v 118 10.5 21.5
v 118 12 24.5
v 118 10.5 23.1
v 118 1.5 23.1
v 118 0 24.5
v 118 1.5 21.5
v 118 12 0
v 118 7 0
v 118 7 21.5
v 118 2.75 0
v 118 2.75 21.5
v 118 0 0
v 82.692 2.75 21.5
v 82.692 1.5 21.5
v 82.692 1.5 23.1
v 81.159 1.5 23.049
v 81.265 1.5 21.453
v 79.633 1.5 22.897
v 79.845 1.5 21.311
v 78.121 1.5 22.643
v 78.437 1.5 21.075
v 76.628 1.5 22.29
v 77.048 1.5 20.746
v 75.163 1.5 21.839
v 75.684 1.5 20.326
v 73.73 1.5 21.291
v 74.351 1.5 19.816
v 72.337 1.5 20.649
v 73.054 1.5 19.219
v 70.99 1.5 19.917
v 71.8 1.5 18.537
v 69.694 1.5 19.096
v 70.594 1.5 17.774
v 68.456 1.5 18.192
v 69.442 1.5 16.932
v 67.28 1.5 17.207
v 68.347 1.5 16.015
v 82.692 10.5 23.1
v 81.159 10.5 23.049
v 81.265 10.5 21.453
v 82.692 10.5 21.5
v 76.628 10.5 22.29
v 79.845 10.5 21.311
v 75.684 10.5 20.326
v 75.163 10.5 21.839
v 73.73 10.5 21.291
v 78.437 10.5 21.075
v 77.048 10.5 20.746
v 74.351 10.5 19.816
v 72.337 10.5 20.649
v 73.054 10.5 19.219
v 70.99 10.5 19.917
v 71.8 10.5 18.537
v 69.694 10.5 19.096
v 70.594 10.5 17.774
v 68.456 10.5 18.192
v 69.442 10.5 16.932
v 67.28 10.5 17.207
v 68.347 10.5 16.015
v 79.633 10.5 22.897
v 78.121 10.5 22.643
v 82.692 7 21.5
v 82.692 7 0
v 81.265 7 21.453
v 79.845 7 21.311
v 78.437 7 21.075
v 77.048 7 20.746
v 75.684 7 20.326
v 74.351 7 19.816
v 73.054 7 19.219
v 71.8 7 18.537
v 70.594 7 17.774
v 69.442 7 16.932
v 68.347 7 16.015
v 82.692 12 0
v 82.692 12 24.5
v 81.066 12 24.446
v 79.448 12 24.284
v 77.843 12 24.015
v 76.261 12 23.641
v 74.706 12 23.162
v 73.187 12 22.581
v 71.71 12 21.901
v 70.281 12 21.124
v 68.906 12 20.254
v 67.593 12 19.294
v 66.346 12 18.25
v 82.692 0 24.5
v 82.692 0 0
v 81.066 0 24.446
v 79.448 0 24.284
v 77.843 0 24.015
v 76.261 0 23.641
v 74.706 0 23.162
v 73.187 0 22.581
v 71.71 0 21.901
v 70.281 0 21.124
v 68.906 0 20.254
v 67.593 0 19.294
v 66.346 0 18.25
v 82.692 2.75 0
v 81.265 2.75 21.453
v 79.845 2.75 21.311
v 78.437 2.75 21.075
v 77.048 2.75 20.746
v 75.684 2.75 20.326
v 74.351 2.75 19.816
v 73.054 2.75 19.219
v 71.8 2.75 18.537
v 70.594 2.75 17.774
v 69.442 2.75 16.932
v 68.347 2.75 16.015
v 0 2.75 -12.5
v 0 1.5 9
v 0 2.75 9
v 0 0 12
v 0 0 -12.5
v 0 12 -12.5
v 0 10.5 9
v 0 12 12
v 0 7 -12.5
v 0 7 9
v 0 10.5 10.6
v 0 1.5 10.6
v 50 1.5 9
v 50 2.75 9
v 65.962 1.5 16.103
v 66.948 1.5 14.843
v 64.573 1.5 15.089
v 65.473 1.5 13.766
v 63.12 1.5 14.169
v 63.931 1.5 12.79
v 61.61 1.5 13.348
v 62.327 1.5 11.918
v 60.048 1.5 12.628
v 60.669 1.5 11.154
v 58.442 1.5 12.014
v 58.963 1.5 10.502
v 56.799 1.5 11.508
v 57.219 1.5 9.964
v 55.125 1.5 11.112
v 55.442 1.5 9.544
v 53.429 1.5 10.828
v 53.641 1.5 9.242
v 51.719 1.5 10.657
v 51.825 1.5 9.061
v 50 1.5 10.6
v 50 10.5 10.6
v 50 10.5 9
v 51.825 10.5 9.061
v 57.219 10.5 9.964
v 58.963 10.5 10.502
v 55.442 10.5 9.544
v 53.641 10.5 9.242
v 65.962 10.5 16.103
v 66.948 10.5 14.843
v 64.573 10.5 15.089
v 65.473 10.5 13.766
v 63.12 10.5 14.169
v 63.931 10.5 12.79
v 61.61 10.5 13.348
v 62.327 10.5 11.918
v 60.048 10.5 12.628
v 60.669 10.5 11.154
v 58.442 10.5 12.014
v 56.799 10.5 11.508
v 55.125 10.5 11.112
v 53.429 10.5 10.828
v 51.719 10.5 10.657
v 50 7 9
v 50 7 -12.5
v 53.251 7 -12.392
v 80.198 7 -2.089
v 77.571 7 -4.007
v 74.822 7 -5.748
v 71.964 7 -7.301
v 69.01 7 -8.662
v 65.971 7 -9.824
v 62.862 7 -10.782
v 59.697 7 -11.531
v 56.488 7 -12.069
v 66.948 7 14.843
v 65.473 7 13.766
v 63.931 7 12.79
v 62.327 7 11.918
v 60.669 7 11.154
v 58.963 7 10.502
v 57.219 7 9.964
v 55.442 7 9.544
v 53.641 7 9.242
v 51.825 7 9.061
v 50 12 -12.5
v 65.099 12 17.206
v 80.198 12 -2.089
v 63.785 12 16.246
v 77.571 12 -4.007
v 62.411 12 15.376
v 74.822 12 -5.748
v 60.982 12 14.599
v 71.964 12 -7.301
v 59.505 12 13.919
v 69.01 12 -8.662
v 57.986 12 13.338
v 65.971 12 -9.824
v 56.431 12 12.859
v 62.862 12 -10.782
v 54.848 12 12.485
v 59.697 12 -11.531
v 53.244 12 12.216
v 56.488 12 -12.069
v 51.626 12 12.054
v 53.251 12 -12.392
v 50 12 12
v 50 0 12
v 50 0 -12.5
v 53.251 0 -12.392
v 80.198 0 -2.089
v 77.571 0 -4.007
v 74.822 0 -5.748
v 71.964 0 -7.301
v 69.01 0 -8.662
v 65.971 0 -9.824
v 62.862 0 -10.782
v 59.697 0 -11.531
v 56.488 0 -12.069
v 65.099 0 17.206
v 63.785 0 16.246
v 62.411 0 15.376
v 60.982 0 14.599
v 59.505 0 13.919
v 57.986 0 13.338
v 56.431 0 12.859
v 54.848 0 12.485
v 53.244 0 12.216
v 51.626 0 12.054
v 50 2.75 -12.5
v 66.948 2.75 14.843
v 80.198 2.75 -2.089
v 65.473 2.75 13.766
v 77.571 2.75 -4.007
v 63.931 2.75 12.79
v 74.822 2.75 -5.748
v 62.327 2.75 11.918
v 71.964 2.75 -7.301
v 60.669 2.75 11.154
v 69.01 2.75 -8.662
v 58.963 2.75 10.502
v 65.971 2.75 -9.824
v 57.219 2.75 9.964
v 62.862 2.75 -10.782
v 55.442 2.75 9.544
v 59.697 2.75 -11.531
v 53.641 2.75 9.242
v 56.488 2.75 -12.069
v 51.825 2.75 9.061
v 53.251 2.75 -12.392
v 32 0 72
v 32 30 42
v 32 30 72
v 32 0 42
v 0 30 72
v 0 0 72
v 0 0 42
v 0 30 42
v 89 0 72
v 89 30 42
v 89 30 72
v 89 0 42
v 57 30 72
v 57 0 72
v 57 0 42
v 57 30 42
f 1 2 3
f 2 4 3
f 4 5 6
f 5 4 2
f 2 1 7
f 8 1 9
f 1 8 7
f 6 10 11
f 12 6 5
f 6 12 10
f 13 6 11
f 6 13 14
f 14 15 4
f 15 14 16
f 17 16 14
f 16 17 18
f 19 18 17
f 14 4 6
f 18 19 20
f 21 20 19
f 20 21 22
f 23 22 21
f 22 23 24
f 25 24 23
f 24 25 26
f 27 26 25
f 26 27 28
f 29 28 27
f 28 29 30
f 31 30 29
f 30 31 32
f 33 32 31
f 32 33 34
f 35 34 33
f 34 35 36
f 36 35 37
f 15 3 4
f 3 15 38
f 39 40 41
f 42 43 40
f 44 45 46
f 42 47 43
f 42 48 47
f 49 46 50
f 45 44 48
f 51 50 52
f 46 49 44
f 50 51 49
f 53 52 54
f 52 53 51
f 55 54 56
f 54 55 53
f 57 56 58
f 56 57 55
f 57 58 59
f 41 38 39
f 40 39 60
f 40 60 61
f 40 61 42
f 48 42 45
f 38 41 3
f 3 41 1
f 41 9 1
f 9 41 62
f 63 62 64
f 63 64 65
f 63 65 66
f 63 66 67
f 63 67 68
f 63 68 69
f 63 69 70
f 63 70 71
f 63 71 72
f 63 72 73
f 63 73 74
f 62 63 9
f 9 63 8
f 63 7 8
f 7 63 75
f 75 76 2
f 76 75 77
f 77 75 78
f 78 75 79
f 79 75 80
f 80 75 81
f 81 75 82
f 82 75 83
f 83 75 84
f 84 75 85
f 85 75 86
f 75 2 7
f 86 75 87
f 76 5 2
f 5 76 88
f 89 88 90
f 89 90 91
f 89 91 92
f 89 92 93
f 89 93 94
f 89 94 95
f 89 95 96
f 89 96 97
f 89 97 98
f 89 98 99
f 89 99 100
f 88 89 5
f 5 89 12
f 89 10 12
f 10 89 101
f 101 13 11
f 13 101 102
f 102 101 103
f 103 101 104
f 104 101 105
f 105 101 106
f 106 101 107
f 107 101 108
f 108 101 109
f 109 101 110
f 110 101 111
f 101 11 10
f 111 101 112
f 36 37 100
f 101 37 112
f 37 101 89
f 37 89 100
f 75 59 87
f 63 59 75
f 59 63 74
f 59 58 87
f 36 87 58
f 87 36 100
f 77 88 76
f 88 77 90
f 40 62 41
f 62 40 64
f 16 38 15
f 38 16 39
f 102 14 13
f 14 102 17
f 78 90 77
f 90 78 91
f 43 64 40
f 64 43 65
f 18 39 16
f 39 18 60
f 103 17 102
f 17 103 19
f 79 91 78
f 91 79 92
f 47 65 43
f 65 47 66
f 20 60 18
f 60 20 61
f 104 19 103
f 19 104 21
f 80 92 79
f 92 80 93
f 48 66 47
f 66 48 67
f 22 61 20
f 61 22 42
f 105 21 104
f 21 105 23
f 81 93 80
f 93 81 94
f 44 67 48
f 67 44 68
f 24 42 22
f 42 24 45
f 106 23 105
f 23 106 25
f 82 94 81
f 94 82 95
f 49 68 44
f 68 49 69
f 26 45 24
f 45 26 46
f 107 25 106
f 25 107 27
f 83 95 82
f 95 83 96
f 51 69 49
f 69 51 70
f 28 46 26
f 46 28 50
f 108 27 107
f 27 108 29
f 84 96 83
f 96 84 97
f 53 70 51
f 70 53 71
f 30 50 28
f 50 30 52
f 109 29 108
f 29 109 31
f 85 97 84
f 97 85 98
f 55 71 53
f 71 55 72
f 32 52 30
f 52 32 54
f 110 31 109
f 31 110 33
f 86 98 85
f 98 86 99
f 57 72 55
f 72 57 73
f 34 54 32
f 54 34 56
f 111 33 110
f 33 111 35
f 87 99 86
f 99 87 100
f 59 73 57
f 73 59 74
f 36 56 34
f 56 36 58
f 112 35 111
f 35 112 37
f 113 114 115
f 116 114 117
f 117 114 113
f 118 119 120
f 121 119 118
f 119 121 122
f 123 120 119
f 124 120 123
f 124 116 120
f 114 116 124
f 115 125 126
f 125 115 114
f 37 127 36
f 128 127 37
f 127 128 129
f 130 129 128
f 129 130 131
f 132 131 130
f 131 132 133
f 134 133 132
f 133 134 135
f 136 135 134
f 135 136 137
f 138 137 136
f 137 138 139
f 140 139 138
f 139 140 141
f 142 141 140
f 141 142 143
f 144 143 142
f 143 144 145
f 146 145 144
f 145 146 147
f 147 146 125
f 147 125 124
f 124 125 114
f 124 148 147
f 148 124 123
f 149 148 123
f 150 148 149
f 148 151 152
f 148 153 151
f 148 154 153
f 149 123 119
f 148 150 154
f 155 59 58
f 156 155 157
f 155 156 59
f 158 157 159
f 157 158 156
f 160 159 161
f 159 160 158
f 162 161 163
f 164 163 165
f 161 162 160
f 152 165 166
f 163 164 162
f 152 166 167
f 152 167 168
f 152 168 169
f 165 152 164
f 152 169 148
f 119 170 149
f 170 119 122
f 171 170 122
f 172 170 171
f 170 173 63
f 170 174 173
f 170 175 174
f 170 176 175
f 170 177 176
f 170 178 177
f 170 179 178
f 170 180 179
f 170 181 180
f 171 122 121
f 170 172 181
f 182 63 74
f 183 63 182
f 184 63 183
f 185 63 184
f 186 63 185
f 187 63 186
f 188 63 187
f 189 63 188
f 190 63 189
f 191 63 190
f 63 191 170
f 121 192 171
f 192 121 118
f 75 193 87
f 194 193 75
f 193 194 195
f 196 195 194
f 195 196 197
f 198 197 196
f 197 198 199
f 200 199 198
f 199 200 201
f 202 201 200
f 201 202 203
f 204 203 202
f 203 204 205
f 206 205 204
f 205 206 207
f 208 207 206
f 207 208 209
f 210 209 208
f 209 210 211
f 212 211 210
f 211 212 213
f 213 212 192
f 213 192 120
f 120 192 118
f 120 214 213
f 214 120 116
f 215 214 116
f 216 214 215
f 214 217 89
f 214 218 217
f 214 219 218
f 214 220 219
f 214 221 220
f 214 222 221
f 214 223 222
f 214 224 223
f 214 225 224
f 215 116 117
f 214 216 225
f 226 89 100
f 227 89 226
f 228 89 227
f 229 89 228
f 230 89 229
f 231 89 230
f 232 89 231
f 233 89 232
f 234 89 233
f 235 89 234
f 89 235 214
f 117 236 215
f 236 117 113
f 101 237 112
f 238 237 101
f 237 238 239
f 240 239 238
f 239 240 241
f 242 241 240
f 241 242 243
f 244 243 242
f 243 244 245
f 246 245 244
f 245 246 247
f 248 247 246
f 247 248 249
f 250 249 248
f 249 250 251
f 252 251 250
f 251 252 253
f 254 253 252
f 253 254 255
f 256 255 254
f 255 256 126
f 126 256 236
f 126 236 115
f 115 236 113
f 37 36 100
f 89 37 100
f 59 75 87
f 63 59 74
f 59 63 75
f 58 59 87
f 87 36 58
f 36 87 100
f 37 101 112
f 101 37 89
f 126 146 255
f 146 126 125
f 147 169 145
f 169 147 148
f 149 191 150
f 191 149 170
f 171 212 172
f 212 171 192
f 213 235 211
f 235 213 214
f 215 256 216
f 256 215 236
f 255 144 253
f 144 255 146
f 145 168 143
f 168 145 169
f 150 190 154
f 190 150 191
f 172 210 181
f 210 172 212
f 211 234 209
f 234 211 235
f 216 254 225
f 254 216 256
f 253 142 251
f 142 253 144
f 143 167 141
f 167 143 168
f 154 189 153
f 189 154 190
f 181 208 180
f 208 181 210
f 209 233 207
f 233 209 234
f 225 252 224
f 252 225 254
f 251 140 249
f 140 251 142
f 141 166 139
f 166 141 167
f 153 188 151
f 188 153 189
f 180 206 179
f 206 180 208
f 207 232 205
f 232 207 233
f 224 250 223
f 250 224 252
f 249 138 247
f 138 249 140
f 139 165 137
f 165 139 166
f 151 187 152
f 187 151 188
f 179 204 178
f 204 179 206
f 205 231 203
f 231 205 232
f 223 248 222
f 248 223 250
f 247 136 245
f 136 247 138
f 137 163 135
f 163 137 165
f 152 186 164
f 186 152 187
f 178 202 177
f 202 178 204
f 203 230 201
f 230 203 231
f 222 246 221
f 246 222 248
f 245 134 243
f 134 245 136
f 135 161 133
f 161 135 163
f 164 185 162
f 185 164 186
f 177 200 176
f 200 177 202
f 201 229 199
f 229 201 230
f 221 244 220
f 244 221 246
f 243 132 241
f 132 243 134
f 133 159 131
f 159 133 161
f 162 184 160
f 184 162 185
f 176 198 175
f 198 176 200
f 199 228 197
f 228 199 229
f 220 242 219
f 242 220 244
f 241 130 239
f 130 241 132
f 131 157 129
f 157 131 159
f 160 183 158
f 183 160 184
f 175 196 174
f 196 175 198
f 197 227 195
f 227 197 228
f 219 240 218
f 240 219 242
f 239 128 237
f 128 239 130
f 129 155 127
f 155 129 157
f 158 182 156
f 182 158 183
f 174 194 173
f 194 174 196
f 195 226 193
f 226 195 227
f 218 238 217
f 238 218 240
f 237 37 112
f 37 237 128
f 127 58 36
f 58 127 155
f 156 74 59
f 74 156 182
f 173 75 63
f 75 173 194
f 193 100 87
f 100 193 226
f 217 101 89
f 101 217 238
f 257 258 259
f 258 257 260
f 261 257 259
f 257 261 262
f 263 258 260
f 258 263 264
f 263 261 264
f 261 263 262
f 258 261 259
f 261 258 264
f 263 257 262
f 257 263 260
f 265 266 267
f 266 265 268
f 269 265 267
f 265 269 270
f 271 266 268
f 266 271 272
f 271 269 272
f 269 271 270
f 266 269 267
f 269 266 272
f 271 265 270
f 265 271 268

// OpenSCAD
// Parameters for a parameterized drag feeder for the YY1 with better peeling

// The idea is that instead of using the under-tape tensioner (which gives inconsistant results depending on the component, the tape, etc), this uses a toothed wheel that engages the tape and has a 2mm step length.

// Initial version does not include a curve for output feeding, instead it just ends a bit early and the tape should just be manually routed into the discharge trench.  This is designed to also make it easier to remove the excess tape.


// The width of the tape (mm)
feederWidth = 8;

// The additional width for the entire feeder assembly
additionalWidth = 4;

// The length of a feeder unit
feederLength = 118;

// Where on the feeder the pick happens
pickStart = 5;

// And the length of the opening
pickLength = 20;

// How deep the drag feeder pin is assumed to be
pinDepth = 5;

// And how wide the opening for it
pinWide = 2.4;

// Where on the feeder to include the friction unit
frictionLocation = 75;

// Where the base of the tape is located
tapeBase = 21.5;

// How wide the tape groove is:  Paper tape is 1.1mm thick max, plastic is 0.6mm.
tapeThick = 1.6;

// How much to support the sprocket side
supportLeftSize = 1.75+1.25;

// How much to support the opposite side
supportRightSide = 0.75;

// How much additional tape clearance horizontally on each side
tapeClearance = 0.5;

// Bearing inner diameter (mm)
bearingID = 4;

// Bearing outer diameter (mm)
bearingOD = 11;

// Bearing length (mm) for the portion that
// overlaps.  The bearing itself is 4mm 
// but we want some spacing
bearingLength = 3.5;

// Bearing OD margin, adjust in your printer for a snug fit.
bearingODMargin = 0.05 ;

// Bearing ID Margin, adjust in your printer for a snug fit.
bearingIDMargin = 0.0;

// Number of gear pins to engage the tape.
gearPins = 18;

// How much smaller should the gear itself be
gearReduction = 0.3;

// Gear pin radius, the holes are .75mm radius
// that it engages into
gearPinRadius = 0.5;

// Gear pin length
gearPinLength = 1.2;

// Gear pin base height;
gearPinBaseHeight = .45;

printGear = true;
printHolder = true;
printBase = true;
printGearHolder = true;

baseHeight = 8;
baseWidth = 10;
baseLength = 156;


// Derived, the radius for the 
// gear itself that engages in the tape:
// The pins are 4mm apart on the tape
gearRadius = (gearPins * 4) / (2 * PI) - gearReduction;

// The distance between the center of the gear and the teeth on the tape itself
tapeOffset = gearRadius + gearReduction;

// The height of the gear that engages the pins.
gearHeight = 4.9 + (feederWidth - 8) ;

// The size of the teeth in the gear for engaging the friction spring.
toothSize = 4.0;

// The radius for locating the cubes that engage the friction spring.
toothRadius = 4.2;

holderSpace = 8.0 - 1.8;

sideThick = 2;

springSpace = toothRadius + toothSize/sqrt(2)/2 + .3; // 0.2;

springThick = 2.0;

springMargin = 0.8;

springLong = 8;

// Bearing cushion in the gear
bearingCushionDepth = 0.5;

// Thickness of the top
topThick = 0.8;

// Using 8mmx3mm magnets in the base

magnetRadius = 4.05;
magnetThick = 3.2;

magnetLoc1 = 10;
magnetLoc2 = feederLength - 10;
magnetLoc3 = feederLength/2;

notchOne = 30;

notchTwo = 95;

notchWidth = baseWidth;

margin = .2;

baseTapeHeight = tapeBase;
profileHeight = tapeBase+3;

lowProfileHeight = 12;
lowProfileLength = 50;

module profile() {
  width = feederWidth + additionalWidth;
  leftWidth = width - additionalWidth/2-supportLeftSize;
  leftTapeSlot = width - additionalWidth/2 + tapeClearance;
    rightTapeSlot = additionalWidth/2 - tapeClearance;
  rightWidth = additionalWidth/2 + supportRightSide;
  tapeBase = baseTapeHeight;
  tapeTop = tapeBase + tapeThick;
  height = profileHeight;
  polygon([[0,0],
          [0,height],
           [width, height],
           [width, 0],
           [leftWidth, 0],
           [leftWidth, tapeBase],
           [leftTapeSlot, tapeBase],
           [leftTapeSlot, tapeTop],
           [rightTapeSlot, tapeTop],
           [rightTapeSlot, tapeBase],
           [rightWidth, tapeBase],
           [rightWidth, 0]
           ]);
}

module profileFeeder(){
difference(){
  // Want the angle to be such that the increase in 
  // height for each direction is half the difference.
  
  heightDifference = (profileHeight-lowProfileHeight)/2;
  
  // Added height is (1 - cos(angle) * profileHeight, so 
  // we have cos(angle) = 1-heightDifference/profileHeight)
  
  profileAngle = acos(1-heightDifference/profileHeight);
  pickAt = feederLength-pickStart-pickLength;
  lowLength = lowProfileLength;
  curveLength = sin(profileAngle) * profileHeight;
  
  
  topOfCurveHeight = (1 - cos(profileAngle)) * profileHeight + lowProfileHeight ;
  
  union(){
  
  // First part, at the low range
  translate([0,0,lowProfileHeight-profileHeight]) rotate([90,0,90]) linear_extrude(lowLength) profile();

  // Then the curve up: its radius along
  // the top is profileHeight, along the bottom it is 2*profileHeight  
  translate([lowProfileLength,0,lowProfileHeight-profileHeight+2*profileHeight]) {
        rotate([0,90,90])
        rotate_extrude(angle=-profileAngle, $fn=100) 
        rotate(90) 
        translate([0, -2*profileHeight])
        profile();
    }
    
    translate([lowProfileLength + 2 * curveLength, 0, 0]) {
      rotate([90,0,90]) linear_extrude(feederLength - lowLength - 2 * curveLength) profile();
    
    
      rotate([0,90,90])rotate_extrude(angle=-profileAngle, $fn=100) rotate(90) profile();
    
    }
    
   
  }
//   translate([-100,-100,-100]) cube([500,500,100]);
  }
}


module profileFeederAssembled(){
    ficHigh = 24.4;

  difference() {
    profileFeeder();

      
      translate([feederLength - pickStart - pickLength, 
        additionalWidth + feederWidth - 1.75 - pinWide,
        tapeBase - pinDepth]) cube([pickLength, pinWide, 100]);
        
     
     translate([feederLength - magnetLoc1, (feederWidth + additionalWidth)/2, -0.1]) cylinder(h=magnetThick+.1, r=magnetRadius, $fn=100);
     
          
     translate([feederLength - magnetLoc2, (feederWidth + additionalWidth)/2, -0.1]) cylinder(h=magnetThick+.1, r=magnetRadius, $fn=100);
     
          
     translate([feederLength - magnetLoc3, (feederWidth + additionalWidth)/2, -0.1]) cylinder(h=magnetThick+.1, r=magnetRadius, $fn=100);
     
     translate([feederLength-frictionLocation, -1, ficHigh]) rotate([-90, 0, 0]) cylinder(h=100, r=gearRadius + gearPinLength+1, $fn=100);
     
    translate([notchOne-notchWidth/2, 20, 0]) rotate([90,0,0]) baseHoleExtrusion(); //cube([notchWidth, 100, notchHeight]);
    
     translate([notchTwo-notchWidth/2, 20, 0]) rotate([90,0,0]) baseHoleExtrusion(); //cube([notchWidth, 100, notchHeight]);
   }
   difference(){
   translate([feederLength - frictionLocation, 0, ficHigh]) rotate([-90,0,0]) gearHolder();
    translate([20,additionalWidth/2,-14.5]) cube(30);
   }

  }



module displayHeads(){
  color("red") {
    translate([0,0,42]) cube([32,30,30]);
    translate([32+25,0,42]) cube([32,30,30]);
    }
}


module baseExtrusion(){
  rotate([90,0,90])
  linear_extrude(height=baseLength){
     polygon(points = [[0,0],[0,baseHeight],[baseWidth, baseHeight],[baseWidth+2, 0]]);
  }
}
 module baseHoleExtrusion(){
   rotate([0,0,0])
   linear_extrude(height=100) {
      polygon(points = [[-margin, -margin],
      [-margin, baseHeight+margin],
      [baseWidth+margin, baseHeight+margin],
      [baseWidth+2+margin, margin],
      [baseWidth+2+margin, 0]]);
        
   }
}

module base(){
  difference(){
//    baseHoleExtrusion();
    baseExtrusion();
    for(i = [0 : 3]) {
      translate([baseLength-5.5 - i * 46.5, baseWidth/2, -1]) cylinder(h=100, r=1.2);
    }
    
    }
}

module gearTeeth() {
  for(i = [0: gearPins * 2]) {
     rotate([0, 0, i * (360 / (gearPins * 2))])
     translate([toothRadius,-1 * toothSize / sqrt(2),0]) rotate([0,0,45]) cube([toothSize,toothSize,gearHeight]);
  
  }
  cylinder(h=gearHeight, r=toothRadius);

  }

module gear(){
  // Circumference = 2 * pi * r
  cylinder(h=1, r=gearRadius, $fn=100);
  difference(){
    gearTeeth();
     translate([0,0,gearHeight-bearingLength]) cylinder(h=feederWidth, r=bearingOD/2 + bearingODMargin, $fn=100);
     translate([0,0,gearHeight-bearingLength-bearingCushionDepth]) cylinder(h=feederWidth, r = bearingOD/2 - 1, $fn=100);
  }
  for(i = [0:gearPins]) {
    translate([0,0,gearPinBaseHeight])
    rotate([0, 90, i * (360 / gearPins)]){
    cylinder(h=gearPinLength + gearRadius, r=gearPinRadius, $fn=100);
    translate([0,0,gearPinLength + gearRadius]) sphere(r=gearPinRadius, $fn=100);
    }
  }
}

// make the center hollow so the bearing can be pushed out
module gearIntersection(){
  difference(){
     gear();
     translate([0,0,-1]) cylinder(h=100, r=bearingOD/2 -1, $fn=100);

   }

}


module spring(){
  intersection(){
  rotate([0,0,45]) cube([toothSize, toothSize, holderSpace]);
   translate([-10,-3,0]) cube([15,5.5,15]);
  }  
  translate([-springLong, -springThick/2 +  sqrt(2) * toothSize/2, 0]) cube([springLong * 2, springThick, sideThick]);
}

module springCutout(){
  translate([-springLong, sqrt(2) * toothSize/2 - springMargin - springThick/2, 0]) cube([2 * springLong,springThick + 2 * springMargin,10]);
  
  translate([0, -springMargin*sqrt(2), 0])rotate([0,0,45]) cube([toothSize + 2 * springMargin,toothSize + 2 * springMargin,100]);

  //translate([-springLong, -springSpace-springThick/2, 0]) cube([2 * springLong, springThick + 2 * springMargin, 100]);

}

trackRadius = gearRadius + 2.2;

module gearHolder(){
  cylinder(h=holderSpace, r = bearingID/2 - bearingIDMargin, $fn=100);
  
  cylinder(h=holderSpace-bearingLength, r= bearingID/2 + 1, $fn=100);

  difference(){
    cylinder(h=additionalWidth/2, r=trackRadius+3);
  translate([-feederLength+frictionLocation,-3,0]) cube([20,20,sideThick]);
  translate([0, springSpace, -0.1]) springCutout();
  }
  translate([0, springSpace, 0]) spring();
  
  difference(){
     union(){
     cylinder(h=feederWidth+additionalWidth, r=trackRadius+1, $fn=100);
     cylinder(h=1, r=trackRadius+3, $fn=100);
          translate([0,0,feederWidth+additionalWidth-1])     cylinder(h=1, r=trackRadius+3, $fn=100);
    
    
    translate([-43.5,22.5,0]) rotate([0,0,-45]){
   
     cube([50,29,2]);
     translate([0,0,feederWidth+2]) cube([50,29,2]);
     
     }
      translate([-18,0,0]) cylinder(h=feederWidth+additionalWidth, r=1.4, $fn=100);

 //         translate([-50,20,0]) rotate([0,0,-45]) cube([50,29,2]);
 
     }
     
     translate([0,0,additionalWidth/2])cylinder(h=50, r=trackRadius, $fn=100);
     translate([-50,12,-1]) cube(100);
       translate([0, springSpace, -0.1]) springCutout();
  
     translate([0,-7,additionalWidth/2]) cube([100,40, 100]);
     }
     
    
}




profileFeeder();  

displayHeads();
